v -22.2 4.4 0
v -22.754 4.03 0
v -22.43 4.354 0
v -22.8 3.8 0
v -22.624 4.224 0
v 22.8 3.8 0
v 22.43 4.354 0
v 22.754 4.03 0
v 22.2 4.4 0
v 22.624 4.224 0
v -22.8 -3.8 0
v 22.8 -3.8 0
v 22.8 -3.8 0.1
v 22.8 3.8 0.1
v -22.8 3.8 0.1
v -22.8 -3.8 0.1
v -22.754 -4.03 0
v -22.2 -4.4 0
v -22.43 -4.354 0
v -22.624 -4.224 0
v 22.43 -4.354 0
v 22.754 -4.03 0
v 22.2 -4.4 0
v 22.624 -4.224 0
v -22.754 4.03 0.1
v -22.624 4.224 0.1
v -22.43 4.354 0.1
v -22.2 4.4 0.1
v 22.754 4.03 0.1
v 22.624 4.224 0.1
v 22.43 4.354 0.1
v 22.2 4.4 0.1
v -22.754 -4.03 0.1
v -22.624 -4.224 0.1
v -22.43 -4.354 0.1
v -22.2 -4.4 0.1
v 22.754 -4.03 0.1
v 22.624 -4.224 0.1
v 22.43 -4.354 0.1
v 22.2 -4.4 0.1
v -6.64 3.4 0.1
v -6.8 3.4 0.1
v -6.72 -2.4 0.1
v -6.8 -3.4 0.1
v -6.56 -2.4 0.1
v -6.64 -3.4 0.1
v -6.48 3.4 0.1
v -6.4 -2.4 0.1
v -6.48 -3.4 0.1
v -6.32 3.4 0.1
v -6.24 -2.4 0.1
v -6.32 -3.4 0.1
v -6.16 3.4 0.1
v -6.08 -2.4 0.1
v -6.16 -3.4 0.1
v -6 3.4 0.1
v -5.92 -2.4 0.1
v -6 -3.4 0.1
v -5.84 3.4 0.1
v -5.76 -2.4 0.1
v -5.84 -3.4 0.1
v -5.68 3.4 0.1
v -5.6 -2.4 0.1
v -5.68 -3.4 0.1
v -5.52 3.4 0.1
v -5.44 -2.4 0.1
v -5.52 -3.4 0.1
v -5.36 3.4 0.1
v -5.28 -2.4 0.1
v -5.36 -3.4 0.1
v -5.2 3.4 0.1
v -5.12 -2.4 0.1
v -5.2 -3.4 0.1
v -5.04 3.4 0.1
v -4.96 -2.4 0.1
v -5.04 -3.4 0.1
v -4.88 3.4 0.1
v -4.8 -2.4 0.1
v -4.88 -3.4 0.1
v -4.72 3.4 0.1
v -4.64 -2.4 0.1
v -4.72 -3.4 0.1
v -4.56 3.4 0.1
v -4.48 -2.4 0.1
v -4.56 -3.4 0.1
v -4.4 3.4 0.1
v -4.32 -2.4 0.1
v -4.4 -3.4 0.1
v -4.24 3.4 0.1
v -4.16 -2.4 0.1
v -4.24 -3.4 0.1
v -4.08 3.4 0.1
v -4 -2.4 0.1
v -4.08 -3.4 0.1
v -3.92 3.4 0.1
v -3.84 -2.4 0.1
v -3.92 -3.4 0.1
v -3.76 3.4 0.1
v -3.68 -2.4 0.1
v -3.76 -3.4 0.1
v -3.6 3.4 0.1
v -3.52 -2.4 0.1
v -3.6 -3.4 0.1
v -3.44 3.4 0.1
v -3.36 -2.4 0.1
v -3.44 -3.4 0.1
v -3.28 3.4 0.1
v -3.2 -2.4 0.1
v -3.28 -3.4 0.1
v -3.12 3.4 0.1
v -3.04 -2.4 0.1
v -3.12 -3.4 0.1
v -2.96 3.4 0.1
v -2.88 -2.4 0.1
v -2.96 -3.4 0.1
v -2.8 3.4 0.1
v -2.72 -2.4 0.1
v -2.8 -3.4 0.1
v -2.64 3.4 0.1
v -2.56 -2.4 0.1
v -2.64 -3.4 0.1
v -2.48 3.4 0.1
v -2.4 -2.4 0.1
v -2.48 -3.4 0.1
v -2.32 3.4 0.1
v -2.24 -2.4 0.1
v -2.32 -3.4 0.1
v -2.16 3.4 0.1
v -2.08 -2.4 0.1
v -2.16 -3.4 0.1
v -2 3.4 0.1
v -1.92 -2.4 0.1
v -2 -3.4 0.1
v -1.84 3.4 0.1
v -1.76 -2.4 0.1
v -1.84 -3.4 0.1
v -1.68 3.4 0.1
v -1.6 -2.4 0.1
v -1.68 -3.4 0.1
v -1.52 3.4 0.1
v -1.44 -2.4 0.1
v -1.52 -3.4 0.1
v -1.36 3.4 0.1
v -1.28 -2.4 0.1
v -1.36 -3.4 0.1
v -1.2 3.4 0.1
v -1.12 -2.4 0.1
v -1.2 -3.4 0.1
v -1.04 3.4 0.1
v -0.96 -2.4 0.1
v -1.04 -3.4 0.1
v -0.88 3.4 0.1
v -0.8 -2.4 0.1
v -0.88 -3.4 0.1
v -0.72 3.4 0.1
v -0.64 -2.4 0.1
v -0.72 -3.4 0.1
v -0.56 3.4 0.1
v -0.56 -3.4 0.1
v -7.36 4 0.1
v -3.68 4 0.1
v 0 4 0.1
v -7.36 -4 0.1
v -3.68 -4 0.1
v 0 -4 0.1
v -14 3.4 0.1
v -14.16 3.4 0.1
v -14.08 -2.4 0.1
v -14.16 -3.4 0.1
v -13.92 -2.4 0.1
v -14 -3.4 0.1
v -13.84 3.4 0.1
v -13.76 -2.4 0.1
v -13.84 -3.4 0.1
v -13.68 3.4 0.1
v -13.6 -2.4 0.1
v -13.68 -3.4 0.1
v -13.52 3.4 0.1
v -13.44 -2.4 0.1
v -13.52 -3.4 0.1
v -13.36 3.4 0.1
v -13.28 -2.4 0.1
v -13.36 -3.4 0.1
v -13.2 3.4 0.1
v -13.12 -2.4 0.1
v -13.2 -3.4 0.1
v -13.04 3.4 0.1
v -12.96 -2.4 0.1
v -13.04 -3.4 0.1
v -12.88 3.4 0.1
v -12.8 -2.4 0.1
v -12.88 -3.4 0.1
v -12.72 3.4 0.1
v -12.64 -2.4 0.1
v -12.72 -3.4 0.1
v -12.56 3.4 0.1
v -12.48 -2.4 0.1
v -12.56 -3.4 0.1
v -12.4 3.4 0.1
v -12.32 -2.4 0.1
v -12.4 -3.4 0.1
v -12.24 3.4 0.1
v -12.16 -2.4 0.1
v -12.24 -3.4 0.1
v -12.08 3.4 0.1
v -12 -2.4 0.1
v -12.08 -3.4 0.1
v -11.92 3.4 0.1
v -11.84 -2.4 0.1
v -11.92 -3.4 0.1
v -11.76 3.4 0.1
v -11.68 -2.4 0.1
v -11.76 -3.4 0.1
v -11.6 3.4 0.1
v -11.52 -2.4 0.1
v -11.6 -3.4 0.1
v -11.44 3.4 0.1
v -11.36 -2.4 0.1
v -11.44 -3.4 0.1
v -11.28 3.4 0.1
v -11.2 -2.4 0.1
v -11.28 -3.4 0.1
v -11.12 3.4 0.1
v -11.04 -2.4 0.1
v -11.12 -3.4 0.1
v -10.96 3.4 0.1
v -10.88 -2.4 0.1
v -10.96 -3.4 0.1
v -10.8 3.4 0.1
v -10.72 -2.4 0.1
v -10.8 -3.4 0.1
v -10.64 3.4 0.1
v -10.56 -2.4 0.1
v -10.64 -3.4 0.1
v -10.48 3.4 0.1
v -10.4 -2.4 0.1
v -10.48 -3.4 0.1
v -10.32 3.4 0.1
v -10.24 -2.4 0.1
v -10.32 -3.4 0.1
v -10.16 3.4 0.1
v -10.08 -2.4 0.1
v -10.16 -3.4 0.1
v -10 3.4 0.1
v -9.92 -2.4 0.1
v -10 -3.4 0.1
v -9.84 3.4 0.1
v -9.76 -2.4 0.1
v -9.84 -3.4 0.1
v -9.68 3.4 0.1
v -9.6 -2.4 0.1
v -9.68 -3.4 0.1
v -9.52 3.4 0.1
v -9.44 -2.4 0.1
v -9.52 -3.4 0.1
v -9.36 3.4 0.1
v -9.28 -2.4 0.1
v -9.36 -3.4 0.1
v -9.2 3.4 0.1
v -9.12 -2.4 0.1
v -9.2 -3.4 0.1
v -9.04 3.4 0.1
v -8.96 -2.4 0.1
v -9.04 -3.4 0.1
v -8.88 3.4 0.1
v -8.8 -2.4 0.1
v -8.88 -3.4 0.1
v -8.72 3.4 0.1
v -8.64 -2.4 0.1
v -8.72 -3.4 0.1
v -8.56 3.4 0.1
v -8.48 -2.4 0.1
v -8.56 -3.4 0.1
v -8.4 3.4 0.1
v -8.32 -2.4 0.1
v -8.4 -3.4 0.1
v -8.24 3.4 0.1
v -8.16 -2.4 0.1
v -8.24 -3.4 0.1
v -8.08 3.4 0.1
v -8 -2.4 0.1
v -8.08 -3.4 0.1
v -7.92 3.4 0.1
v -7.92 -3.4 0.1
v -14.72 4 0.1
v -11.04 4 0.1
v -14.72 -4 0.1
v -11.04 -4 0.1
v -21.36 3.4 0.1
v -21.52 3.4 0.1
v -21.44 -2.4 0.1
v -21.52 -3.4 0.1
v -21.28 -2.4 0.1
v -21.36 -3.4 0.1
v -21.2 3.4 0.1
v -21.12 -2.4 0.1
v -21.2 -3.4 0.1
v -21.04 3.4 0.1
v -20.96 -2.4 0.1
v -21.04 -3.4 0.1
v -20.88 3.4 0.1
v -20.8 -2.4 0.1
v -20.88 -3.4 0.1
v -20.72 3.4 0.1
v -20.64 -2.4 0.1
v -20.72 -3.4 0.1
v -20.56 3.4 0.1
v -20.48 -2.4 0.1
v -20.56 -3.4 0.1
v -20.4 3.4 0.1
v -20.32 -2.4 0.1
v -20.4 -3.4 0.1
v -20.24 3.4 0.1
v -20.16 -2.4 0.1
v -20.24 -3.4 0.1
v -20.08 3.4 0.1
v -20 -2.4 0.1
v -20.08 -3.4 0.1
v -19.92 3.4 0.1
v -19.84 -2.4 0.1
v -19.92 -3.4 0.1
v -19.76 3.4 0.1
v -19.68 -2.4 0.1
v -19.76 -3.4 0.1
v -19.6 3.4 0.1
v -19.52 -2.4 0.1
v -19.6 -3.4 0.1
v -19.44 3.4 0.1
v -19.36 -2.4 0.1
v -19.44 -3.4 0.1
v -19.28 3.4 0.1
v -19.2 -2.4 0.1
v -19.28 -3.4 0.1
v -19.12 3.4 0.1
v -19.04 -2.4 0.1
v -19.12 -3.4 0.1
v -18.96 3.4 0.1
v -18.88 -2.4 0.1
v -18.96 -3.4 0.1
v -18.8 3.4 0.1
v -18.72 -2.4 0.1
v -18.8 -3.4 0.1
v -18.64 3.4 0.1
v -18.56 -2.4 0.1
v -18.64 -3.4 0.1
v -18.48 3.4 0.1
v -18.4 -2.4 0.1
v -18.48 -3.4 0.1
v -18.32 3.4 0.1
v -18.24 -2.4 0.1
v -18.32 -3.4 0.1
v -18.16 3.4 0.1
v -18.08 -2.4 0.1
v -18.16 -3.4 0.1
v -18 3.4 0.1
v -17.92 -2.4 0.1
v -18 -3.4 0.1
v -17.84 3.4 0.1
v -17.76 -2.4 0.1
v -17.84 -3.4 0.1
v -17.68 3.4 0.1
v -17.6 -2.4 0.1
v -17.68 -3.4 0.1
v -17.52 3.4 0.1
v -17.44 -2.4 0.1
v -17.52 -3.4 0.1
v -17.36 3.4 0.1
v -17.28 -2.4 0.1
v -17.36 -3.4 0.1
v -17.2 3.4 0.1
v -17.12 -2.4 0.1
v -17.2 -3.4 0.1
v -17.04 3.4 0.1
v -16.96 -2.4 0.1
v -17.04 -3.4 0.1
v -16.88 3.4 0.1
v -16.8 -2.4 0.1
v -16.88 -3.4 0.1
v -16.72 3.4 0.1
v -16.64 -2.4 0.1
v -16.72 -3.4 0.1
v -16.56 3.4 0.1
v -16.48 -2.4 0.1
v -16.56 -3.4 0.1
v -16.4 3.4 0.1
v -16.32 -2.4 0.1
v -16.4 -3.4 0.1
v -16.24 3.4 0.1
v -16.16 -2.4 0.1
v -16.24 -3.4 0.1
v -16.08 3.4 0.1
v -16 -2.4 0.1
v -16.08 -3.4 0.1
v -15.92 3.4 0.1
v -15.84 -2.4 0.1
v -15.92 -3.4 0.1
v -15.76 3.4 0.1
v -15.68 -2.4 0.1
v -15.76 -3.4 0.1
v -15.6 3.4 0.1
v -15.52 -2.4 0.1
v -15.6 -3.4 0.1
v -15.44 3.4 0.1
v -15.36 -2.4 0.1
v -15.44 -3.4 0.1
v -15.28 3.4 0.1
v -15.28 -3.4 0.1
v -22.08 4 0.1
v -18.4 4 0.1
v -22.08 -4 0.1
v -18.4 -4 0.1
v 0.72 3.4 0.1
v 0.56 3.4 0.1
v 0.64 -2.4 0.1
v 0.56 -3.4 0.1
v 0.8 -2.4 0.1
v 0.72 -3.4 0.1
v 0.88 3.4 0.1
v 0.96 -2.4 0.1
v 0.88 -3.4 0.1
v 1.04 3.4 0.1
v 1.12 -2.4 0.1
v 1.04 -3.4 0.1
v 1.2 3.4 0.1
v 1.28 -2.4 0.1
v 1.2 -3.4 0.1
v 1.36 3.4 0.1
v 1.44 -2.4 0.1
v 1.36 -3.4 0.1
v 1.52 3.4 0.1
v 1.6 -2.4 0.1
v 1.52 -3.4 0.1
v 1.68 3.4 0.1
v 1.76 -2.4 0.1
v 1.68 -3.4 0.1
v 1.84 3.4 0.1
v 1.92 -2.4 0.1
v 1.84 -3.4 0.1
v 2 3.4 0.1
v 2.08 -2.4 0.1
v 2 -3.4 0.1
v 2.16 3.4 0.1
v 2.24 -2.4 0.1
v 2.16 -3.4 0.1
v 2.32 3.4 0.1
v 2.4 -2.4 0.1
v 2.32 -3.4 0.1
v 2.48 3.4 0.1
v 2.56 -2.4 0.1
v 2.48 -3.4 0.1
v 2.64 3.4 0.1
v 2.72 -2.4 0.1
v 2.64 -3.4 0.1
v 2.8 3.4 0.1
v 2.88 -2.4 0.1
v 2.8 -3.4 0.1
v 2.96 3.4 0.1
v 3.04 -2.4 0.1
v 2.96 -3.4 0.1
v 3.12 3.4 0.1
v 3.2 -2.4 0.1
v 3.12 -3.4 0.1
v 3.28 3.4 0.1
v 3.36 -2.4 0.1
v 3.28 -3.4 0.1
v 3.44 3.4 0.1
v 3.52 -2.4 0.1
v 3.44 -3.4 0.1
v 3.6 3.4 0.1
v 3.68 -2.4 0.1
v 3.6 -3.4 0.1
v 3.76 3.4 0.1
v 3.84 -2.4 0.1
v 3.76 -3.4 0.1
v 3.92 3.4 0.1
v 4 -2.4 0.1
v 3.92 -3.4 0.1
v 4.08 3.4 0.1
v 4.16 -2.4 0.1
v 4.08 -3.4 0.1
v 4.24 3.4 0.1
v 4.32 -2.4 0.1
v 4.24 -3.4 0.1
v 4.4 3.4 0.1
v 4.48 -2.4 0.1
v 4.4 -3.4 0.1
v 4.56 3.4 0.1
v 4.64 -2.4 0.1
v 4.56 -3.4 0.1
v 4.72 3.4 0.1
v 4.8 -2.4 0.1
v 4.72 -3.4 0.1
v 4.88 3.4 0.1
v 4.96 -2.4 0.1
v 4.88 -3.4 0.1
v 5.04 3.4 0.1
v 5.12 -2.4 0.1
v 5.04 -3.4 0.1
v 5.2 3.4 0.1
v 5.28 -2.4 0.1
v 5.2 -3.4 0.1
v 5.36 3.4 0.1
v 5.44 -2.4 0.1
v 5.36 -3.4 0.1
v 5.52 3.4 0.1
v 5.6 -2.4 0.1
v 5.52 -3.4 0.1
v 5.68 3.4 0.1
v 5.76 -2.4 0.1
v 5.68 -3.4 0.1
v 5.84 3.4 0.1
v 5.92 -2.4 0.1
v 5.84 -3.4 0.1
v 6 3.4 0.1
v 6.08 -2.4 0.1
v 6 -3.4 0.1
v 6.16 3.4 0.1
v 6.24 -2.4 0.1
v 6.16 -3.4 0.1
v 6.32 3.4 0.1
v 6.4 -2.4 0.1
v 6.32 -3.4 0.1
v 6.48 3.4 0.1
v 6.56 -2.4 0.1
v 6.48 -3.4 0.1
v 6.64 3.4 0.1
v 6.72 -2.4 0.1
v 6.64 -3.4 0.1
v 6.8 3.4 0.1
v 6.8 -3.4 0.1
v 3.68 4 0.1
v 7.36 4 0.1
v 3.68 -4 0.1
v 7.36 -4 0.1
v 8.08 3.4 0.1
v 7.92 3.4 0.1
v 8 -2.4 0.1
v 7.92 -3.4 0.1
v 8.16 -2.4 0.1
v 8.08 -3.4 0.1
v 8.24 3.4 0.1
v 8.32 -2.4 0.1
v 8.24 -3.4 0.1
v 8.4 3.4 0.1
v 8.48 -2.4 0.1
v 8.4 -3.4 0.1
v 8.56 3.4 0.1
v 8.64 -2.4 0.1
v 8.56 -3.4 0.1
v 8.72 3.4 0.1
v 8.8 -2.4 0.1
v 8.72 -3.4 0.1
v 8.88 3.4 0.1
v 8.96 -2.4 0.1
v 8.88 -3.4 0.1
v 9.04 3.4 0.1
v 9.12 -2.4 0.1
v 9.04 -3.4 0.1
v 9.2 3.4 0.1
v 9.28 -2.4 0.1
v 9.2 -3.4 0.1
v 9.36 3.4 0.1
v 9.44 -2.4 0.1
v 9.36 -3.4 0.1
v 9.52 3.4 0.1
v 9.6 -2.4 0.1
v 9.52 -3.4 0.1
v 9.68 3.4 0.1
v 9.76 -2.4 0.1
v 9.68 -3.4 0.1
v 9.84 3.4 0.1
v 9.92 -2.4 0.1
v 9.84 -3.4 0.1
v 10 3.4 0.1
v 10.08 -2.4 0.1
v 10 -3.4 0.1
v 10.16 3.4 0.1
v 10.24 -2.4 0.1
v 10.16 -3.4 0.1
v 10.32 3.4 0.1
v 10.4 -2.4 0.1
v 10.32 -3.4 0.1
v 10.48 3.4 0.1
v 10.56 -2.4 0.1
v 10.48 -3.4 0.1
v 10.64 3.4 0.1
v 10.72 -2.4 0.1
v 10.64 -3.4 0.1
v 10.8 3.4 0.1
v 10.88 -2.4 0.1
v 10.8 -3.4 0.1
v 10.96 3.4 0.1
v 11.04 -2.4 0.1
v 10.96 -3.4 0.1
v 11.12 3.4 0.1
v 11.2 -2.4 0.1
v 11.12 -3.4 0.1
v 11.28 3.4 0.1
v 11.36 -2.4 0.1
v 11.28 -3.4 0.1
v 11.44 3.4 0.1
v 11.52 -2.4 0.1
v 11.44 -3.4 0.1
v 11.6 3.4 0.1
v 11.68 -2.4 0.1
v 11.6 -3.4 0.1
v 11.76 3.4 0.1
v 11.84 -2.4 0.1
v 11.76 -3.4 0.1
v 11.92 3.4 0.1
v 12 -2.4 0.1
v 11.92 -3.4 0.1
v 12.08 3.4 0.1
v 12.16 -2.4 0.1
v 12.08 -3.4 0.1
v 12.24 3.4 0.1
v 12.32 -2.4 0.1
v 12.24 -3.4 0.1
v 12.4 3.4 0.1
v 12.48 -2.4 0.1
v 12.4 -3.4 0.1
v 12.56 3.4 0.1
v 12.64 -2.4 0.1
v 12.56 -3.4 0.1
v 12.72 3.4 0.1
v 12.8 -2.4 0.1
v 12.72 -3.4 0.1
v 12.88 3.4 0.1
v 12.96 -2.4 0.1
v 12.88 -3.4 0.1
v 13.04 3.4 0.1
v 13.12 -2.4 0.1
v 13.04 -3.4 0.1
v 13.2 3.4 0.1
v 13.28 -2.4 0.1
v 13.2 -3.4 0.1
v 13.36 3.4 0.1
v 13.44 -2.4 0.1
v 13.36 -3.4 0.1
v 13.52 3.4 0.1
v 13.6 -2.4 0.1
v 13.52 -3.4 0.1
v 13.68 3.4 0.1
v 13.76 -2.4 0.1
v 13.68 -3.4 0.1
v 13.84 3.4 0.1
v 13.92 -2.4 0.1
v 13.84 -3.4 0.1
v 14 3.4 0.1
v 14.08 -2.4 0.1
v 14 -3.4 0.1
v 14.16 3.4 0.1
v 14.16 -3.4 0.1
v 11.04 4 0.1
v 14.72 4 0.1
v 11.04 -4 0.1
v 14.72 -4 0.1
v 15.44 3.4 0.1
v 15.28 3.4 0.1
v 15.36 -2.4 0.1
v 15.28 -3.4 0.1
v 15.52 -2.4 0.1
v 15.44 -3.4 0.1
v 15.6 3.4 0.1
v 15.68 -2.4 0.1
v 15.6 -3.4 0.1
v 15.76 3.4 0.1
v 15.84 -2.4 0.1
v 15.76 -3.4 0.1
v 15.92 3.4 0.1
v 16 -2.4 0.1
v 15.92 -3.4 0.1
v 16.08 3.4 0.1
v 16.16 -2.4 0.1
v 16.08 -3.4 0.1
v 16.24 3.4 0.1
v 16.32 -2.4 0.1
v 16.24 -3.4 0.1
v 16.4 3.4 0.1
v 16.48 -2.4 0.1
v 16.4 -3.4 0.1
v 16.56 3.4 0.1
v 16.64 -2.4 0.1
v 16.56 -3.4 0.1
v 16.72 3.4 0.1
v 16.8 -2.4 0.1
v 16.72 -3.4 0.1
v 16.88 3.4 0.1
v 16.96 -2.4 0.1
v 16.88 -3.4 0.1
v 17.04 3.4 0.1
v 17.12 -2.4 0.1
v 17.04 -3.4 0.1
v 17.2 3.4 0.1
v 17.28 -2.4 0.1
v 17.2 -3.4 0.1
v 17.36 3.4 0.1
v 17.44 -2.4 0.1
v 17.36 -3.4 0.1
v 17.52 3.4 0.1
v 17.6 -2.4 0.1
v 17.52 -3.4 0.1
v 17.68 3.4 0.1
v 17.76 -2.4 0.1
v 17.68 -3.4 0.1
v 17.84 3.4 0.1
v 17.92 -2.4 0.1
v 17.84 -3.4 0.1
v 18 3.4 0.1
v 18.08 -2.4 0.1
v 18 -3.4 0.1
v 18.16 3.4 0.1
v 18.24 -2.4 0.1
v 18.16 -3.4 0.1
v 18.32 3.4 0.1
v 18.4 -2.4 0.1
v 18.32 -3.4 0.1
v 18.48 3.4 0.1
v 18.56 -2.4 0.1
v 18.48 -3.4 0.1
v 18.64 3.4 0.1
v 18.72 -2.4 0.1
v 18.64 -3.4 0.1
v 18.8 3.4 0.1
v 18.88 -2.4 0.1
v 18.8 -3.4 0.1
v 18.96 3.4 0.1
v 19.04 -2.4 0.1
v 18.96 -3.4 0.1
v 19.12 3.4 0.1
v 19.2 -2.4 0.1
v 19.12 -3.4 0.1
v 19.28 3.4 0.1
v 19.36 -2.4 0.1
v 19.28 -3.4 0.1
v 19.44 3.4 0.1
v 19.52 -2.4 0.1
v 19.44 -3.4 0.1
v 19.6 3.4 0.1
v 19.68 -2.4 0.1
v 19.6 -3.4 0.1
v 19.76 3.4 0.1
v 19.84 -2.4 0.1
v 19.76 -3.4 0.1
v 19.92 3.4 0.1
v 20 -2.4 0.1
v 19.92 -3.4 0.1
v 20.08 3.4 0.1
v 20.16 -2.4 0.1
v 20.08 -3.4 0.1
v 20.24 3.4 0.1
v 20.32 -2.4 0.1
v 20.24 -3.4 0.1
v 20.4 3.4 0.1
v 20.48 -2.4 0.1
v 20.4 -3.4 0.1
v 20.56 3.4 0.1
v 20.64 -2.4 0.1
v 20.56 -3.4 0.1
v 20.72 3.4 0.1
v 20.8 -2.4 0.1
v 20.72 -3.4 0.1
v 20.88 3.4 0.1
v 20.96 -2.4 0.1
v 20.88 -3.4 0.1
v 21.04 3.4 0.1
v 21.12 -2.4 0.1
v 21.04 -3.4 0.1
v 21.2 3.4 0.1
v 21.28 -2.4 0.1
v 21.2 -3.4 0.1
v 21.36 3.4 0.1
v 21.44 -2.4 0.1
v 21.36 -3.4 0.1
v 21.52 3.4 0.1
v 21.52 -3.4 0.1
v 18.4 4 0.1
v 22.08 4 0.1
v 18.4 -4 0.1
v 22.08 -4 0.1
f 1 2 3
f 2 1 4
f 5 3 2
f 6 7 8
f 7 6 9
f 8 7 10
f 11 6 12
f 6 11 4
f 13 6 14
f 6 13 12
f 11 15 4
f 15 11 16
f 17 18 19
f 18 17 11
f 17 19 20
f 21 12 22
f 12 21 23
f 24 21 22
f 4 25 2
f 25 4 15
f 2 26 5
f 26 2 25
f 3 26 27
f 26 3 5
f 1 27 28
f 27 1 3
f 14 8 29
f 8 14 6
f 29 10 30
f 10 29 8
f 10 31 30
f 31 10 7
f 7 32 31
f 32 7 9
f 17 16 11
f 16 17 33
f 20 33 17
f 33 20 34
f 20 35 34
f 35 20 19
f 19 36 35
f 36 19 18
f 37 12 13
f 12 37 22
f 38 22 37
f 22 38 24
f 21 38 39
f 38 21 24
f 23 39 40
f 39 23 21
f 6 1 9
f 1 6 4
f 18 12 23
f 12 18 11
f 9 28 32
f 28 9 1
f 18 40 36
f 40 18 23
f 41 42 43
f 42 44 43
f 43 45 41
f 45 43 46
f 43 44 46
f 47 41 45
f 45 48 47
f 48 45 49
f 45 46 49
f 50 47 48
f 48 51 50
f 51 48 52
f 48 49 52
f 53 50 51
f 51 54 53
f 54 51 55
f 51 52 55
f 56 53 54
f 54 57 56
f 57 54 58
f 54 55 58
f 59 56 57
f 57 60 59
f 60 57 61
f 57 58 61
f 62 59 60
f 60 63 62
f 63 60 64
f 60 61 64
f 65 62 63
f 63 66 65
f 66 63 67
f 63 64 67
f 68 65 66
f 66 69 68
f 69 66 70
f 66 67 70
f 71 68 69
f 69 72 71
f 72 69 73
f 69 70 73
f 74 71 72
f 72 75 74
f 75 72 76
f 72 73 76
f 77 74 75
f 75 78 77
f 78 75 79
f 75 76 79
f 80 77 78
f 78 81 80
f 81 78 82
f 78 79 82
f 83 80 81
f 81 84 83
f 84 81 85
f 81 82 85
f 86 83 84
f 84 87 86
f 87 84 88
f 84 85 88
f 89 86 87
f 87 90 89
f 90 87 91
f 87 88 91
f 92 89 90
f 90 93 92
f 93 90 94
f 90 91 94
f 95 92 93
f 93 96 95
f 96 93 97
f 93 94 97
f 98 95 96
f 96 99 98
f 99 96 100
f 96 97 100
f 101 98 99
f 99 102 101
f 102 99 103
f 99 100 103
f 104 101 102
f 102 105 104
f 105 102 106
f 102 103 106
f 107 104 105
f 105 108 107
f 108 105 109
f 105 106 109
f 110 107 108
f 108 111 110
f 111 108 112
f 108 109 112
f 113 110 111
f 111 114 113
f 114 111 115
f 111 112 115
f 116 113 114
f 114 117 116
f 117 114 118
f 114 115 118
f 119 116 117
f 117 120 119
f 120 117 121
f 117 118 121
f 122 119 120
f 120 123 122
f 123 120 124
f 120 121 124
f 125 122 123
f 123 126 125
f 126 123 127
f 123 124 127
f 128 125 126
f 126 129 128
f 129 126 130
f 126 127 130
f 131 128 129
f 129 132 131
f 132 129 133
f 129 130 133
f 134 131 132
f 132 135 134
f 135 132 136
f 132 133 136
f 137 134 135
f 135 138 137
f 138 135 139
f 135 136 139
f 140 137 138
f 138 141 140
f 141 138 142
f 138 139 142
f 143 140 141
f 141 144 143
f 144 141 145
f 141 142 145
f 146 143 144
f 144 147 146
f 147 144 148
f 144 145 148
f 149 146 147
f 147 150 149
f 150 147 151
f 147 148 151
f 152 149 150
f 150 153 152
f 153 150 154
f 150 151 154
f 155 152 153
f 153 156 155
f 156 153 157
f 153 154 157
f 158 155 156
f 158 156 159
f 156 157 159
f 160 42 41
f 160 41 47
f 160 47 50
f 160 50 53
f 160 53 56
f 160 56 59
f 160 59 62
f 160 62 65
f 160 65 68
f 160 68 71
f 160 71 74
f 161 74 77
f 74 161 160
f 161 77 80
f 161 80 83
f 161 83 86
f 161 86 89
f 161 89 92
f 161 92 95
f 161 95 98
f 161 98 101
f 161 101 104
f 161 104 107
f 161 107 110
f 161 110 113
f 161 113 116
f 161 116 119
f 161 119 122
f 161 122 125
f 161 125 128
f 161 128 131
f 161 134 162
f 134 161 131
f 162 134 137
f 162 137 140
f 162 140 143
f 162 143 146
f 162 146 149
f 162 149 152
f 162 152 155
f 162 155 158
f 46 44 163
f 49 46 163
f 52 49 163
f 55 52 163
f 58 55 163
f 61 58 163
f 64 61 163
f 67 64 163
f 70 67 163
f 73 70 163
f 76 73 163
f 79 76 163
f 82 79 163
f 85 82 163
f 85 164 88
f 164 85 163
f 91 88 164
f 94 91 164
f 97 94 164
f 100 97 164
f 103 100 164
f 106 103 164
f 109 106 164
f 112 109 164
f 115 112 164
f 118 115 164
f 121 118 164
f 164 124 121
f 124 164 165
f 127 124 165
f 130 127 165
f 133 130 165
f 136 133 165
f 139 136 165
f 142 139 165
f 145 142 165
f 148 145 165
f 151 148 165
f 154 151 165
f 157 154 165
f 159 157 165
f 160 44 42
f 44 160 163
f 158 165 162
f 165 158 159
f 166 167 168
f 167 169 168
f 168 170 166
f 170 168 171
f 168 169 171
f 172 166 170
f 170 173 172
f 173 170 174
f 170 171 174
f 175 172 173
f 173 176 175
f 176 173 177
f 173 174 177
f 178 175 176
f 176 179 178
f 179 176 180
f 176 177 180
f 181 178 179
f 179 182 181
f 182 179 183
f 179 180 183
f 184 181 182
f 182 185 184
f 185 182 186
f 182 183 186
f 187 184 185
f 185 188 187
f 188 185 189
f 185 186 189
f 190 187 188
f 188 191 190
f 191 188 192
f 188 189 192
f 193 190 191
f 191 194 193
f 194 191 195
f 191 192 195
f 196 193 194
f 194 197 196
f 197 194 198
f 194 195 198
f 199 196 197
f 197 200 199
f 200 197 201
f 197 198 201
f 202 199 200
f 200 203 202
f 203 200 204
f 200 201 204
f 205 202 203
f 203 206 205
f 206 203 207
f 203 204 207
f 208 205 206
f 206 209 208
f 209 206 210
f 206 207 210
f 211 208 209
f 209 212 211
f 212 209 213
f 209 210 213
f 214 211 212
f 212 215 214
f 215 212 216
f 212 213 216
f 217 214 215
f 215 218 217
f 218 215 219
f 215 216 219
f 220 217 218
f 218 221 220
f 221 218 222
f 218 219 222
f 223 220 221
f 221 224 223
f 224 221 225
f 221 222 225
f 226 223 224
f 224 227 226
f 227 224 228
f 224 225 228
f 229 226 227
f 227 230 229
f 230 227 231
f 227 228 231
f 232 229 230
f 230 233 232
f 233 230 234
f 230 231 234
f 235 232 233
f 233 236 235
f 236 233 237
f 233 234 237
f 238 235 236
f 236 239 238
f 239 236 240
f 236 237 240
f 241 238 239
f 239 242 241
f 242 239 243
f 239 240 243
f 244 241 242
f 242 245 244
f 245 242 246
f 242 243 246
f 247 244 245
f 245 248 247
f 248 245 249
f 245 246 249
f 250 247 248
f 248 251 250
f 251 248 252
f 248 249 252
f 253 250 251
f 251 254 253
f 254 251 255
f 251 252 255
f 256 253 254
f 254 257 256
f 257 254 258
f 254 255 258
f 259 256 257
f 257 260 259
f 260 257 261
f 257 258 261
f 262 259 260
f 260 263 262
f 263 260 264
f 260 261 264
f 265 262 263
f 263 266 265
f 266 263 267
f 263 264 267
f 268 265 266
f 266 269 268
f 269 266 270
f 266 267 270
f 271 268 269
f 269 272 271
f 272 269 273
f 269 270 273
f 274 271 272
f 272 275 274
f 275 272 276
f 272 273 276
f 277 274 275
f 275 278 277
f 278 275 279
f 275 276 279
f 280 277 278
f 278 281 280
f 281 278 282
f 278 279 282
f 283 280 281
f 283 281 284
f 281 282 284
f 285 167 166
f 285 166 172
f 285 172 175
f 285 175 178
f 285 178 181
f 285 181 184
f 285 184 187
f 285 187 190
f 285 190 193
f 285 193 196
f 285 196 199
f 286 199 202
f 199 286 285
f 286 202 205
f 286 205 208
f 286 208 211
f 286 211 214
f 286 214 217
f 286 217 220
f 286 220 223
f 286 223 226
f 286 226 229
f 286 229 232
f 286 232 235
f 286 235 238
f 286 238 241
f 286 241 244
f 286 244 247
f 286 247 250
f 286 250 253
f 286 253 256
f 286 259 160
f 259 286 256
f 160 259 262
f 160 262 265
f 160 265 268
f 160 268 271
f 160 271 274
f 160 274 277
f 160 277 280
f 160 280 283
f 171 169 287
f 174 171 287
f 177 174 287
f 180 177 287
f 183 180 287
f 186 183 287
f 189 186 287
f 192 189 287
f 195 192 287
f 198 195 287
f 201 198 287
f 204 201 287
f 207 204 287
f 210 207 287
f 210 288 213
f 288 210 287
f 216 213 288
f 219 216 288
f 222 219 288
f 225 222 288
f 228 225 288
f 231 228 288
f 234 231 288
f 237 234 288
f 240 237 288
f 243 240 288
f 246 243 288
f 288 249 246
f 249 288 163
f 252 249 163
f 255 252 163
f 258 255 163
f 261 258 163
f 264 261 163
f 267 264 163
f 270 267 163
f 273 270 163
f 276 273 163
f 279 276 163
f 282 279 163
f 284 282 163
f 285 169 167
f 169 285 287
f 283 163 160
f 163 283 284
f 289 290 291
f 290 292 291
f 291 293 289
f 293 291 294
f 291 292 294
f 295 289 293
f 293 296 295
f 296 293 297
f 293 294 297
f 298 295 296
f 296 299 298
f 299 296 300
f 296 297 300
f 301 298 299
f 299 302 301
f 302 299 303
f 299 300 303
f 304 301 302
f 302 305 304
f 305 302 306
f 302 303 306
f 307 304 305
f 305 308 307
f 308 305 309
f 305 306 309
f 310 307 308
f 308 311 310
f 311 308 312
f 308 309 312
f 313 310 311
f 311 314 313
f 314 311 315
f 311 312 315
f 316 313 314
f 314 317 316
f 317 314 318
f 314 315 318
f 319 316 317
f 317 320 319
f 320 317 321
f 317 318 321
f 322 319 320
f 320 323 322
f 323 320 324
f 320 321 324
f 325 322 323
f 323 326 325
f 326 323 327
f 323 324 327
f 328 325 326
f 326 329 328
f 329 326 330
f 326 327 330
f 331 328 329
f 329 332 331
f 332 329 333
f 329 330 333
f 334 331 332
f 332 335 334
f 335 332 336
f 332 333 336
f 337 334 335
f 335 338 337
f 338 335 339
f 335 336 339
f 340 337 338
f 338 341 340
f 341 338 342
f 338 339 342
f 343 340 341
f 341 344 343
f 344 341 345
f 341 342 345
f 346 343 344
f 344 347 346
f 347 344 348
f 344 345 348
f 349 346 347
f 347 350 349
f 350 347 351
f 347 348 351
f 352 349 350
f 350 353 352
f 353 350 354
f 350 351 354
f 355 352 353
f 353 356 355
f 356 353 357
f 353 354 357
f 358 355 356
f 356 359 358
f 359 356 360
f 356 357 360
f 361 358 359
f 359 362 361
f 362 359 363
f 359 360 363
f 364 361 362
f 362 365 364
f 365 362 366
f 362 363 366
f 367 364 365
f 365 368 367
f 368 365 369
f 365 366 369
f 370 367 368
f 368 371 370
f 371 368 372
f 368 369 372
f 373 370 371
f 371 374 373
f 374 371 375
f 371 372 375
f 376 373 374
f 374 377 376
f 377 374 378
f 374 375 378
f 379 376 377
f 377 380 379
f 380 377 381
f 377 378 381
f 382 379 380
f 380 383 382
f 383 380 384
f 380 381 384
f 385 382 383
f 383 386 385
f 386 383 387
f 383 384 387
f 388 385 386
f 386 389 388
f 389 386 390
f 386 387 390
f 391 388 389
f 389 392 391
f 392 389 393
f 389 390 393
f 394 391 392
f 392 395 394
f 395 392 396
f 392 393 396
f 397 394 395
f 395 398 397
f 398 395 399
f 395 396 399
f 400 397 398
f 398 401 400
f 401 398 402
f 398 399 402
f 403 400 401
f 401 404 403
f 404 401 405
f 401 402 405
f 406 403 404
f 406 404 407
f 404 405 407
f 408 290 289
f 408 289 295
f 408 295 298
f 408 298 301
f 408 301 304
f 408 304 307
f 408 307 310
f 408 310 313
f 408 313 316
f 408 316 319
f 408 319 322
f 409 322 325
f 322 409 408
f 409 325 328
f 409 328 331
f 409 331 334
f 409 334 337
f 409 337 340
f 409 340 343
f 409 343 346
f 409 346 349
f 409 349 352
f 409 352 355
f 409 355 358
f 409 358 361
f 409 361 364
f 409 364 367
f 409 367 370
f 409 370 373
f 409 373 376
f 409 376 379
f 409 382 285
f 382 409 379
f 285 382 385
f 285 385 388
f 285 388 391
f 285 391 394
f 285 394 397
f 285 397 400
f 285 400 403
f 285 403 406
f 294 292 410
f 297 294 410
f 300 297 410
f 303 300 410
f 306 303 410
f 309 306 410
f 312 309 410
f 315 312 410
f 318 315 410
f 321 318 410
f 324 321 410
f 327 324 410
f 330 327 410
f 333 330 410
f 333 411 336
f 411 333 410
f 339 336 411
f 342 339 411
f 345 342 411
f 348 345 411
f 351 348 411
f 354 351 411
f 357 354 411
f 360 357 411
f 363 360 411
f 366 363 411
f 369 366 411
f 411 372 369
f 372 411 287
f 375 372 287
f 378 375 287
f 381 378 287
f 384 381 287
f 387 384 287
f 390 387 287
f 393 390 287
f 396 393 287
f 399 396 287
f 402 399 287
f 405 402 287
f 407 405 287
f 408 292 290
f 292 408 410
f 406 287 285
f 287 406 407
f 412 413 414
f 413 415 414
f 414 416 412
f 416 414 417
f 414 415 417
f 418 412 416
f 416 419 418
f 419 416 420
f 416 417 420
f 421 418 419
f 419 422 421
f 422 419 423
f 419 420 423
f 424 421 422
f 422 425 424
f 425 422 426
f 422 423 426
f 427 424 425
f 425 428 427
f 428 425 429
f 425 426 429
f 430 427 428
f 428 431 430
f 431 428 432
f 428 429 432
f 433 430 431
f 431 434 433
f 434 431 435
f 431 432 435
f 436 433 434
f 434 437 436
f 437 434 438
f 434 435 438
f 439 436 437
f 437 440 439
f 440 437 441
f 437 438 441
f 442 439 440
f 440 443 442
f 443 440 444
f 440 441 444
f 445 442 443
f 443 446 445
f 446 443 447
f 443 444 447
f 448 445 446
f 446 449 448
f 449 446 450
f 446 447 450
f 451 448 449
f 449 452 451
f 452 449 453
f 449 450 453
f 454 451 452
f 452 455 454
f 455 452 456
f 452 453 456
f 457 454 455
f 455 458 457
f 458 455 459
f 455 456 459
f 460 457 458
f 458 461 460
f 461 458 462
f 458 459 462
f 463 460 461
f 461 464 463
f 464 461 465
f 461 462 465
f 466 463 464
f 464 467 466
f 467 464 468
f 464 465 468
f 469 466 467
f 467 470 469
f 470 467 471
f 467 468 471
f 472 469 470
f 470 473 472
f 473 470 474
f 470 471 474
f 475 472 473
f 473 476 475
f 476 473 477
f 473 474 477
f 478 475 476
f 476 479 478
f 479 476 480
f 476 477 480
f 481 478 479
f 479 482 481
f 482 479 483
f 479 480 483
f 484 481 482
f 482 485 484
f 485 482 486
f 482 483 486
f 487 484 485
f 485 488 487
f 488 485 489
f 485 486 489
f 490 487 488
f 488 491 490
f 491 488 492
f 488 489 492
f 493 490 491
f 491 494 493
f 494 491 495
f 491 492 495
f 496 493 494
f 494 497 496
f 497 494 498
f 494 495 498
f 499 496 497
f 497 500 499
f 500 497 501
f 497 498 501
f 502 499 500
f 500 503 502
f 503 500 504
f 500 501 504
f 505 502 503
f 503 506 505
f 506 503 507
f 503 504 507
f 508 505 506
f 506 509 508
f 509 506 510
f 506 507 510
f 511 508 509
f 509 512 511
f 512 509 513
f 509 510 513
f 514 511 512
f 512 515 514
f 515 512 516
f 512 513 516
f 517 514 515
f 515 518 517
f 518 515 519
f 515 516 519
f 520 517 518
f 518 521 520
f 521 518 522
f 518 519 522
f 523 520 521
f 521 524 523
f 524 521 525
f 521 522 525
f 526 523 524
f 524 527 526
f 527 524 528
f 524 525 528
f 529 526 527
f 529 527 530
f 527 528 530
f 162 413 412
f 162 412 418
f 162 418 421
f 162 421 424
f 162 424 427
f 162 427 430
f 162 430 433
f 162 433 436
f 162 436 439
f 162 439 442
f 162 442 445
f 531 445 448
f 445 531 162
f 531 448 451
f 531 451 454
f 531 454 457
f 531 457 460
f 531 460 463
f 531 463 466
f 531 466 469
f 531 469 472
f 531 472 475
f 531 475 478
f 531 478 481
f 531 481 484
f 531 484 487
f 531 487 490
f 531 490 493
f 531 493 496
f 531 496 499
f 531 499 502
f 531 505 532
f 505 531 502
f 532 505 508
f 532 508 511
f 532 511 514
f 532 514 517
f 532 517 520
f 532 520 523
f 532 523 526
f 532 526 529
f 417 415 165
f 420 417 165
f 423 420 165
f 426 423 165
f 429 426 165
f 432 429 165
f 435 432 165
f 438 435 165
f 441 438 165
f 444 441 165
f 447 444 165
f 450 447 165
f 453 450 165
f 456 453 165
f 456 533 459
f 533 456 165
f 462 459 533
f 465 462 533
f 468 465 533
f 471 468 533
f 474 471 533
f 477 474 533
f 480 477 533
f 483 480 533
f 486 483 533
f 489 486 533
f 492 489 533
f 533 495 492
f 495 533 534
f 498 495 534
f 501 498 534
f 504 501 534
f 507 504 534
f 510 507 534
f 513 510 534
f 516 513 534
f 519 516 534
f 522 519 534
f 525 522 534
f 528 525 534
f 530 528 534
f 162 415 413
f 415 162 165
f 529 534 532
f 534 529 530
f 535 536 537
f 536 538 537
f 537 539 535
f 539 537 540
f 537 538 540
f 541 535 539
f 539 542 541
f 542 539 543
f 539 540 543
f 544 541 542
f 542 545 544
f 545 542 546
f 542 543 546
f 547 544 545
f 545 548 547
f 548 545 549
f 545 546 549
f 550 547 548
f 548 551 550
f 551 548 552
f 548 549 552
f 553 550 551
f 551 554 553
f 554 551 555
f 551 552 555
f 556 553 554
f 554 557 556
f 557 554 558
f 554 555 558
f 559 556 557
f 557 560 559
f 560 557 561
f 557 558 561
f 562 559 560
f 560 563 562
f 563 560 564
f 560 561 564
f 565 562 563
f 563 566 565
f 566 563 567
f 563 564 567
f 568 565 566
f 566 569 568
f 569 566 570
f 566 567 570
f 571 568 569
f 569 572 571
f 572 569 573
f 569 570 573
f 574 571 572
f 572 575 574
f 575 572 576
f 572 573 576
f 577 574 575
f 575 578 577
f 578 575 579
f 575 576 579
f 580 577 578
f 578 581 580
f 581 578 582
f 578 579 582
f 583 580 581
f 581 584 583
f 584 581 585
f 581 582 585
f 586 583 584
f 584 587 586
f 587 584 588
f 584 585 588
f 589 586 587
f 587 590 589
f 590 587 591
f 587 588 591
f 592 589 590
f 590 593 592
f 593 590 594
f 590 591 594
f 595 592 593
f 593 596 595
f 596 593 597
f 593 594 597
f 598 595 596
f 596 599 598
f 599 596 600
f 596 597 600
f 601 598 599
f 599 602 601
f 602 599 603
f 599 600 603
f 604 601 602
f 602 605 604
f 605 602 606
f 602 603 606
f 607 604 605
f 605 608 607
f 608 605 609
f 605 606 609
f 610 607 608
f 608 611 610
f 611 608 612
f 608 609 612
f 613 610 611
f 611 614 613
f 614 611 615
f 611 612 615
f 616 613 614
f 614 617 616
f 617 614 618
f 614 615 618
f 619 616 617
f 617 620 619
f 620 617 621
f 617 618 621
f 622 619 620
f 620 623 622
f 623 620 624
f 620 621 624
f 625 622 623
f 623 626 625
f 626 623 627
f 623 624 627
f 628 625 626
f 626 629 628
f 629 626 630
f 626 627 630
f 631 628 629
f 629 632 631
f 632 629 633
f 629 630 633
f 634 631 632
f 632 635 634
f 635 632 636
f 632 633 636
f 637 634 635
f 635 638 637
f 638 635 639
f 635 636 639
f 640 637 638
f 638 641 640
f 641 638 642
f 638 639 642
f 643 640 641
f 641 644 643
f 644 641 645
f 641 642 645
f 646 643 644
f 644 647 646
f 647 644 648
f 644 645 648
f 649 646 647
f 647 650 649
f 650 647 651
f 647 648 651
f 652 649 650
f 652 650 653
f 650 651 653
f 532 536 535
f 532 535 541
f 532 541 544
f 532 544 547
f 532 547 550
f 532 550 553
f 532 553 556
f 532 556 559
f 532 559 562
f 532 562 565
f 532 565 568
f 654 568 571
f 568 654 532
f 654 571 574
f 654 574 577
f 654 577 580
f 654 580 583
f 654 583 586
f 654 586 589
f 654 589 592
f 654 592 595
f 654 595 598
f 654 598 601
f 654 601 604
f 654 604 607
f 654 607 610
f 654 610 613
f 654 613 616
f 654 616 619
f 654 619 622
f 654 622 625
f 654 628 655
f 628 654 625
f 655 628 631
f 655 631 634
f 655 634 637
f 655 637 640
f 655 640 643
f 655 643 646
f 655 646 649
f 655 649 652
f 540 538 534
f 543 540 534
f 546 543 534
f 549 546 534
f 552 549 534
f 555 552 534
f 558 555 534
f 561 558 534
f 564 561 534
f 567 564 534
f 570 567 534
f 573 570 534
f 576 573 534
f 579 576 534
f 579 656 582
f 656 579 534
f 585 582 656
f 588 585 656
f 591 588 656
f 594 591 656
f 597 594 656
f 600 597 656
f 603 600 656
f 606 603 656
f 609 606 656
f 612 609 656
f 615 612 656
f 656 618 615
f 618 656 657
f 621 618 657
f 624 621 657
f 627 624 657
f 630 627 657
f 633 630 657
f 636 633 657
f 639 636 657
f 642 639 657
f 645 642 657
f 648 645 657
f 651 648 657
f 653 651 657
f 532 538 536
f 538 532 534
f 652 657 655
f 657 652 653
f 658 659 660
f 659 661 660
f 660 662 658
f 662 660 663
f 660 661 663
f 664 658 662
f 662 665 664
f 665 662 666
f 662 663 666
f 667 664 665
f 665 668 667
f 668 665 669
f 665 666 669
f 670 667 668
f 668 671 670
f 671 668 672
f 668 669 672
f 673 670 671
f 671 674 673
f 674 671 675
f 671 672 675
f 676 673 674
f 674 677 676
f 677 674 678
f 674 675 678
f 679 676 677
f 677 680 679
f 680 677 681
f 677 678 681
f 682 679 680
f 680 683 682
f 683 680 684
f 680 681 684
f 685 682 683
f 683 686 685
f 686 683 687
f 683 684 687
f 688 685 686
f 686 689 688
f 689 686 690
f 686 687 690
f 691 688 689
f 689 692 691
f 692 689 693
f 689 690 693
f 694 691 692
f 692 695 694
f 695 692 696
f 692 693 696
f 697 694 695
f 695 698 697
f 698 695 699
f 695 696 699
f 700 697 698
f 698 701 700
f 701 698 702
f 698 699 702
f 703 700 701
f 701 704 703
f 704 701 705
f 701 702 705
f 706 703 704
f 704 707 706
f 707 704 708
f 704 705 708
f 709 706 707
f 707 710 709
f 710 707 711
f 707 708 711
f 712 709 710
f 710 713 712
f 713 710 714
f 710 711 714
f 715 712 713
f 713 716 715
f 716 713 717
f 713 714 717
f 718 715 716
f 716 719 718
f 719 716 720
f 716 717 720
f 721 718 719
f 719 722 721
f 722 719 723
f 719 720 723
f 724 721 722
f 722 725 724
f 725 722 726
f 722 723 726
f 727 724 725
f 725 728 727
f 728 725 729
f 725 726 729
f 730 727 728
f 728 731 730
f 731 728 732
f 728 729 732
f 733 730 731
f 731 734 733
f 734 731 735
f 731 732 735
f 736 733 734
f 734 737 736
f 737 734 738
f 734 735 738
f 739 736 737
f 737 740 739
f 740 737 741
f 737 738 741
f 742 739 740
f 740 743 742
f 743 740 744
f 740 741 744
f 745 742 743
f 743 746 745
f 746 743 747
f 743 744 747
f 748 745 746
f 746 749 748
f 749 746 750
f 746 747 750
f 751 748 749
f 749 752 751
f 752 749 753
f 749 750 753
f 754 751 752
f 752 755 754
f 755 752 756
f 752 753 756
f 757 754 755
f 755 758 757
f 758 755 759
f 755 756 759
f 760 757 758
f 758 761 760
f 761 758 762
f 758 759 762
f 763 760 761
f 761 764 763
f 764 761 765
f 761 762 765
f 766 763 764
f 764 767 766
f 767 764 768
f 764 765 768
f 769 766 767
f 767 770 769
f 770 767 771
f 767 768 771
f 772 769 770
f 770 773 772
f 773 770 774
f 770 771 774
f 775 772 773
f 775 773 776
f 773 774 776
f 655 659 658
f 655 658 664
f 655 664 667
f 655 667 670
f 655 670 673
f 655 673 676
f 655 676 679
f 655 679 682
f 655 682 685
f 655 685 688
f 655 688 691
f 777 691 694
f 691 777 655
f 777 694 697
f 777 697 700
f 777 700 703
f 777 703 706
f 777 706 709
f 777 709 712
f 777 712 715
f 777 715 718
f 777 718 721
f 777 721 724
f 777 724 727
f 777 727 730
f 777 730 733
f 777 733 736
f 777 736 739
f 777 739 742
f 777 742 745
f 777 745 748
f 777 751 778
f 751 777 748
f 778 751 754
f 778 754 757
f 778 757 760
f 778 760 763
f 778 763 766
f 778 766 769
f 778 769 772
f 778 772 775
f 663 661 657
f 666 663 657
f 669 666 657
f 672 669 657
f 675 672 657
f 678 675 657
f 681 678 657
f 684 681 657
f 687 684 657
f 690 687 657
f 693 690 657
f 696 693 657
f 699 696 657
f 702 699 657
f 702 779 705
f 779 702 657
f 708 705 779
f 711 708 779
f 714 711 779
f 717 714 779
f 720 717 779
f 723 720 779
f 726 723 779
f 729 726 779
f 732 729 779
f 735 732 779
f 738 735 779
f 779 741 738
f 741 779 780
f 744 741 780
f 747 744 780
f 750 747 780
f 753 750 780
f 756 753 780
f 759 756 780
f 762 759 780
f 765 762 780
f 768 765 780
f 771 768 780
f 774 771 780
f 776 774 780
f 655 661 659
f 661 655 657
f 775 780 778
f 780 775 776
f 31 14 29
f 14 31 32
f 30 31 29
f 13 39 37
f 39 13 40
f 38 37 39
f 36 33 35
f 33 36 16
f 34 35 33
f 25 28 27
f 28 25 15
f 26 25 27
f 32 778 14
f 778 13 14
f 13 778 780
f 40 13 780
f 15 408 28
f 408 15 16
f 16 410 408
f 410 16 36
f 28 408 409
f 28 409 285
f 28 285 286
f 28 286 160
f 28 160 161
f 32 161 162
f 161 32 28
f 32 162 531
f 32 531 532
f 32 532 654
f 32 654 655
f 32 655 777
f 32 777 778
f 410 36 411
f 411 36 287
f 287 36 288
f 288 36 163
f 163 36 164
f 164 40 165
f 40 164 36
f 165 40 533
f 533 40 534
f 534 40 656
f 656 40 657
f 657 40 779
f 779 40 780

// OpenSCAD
// file: ../p/box3u12.scad
use <../lib.scad>
function ldraw_lib__box3u12() = [
// 0 Box with 3 Parallel Faces without Any Edges
// 0 Name: box3u12.dat
// 0 Author: J.C. Tchang [tchang]
// 0 !LDRAW_ORG Primitive UPDATE 2014-02
// 0 !LICENSE Licensed under CC BY 4.0 : see CAreadme.txt
// 
// 0 BFC CERTIFY CCW
  [0,"BFC","CERTIFY"],
  [0,"BFC","CCW"],
// 
// 0 !HISTORY 2014-12-23 [PTadmin] Official Update 2014-02
// 
// 
// 4 16 -1 1 1 1 1 1 1 1 -1 -1 1 -1
  [4,16,-1,1,1,1,1,1,1,1,-1,-1,1,-1],
// 4 16 -1 1 1 -1 0 1 1 0 1 1 1 1
  [4,16,-1,1,1,-1,0,1,1,0,1,1,1,1],
// 4 16 1 1 -1 1 0 -1 -1 0 -1 -1 1 -1
  [4,16,1,1,-1,1,0,-1,-1,0,-1,-1,1,-1],
];
module ldraw_lib__box3u12(step=0, col=false, unit=2/5, alt=false, line=0.2, solid=!$preview)
    makepoly(ldraw_lib__box3u12(), step=step, col=col, unit=unit, alt=alt, line=line, solid=solid);
ldraw_lib__box3u12(line=0.2);
// file: ../p/1-4cyli.scad
use <../lib.scad>
function ldraw_lib__1_4cyli() = [
// 0 Cylinder 0.25
// 0 Name: 1-4cyli.dat
// 0 Author: James Jessiman
// 0 !LDRAW_ORG Primitive UPDATE 2012-01
// 0 !LICENSE Licensed under CC BY 4.0 : see CAreadme.txt
// 
// 0 BFC CERTIFY CCW
  [0,"BFC","CERTIFY"],
  [0,"BFC","CCW"],
// 
// 0 !HISTORY 2002-03-23 [sbliss] Added BFC statement.
// 0 !HISTORY 2002-04-25 [PTadmin] Official Update 2002-02
// 0 !HISTORY 2007-06-22 [PTadmin] Header formatted for Contributor Agreement
// 0 !HISTORY 2008-07-01 [PTadmin] Official Update 2008-01
// 0 !HISTORY 2012-02-16 [Philo] Changed to CCW
// 0 !HISTORY 2012-03-30 [PTadmin] Official Update 2012-01
// 
// 
// 4 16 1 1 0 0.9239 1 0.3827 0.9239 0 0.3827 1 0 0
  [4,16,1,1,0,0.9239,1,0.3827,0.9239,0,0.3827,1,0,0],
// 5 24 1 0 0 1 1 0 0.9239 0 0.3827 1 0 -1
  [5,24,1,0,0,1,1,0,0.9239,0,0.3827,1,0,-1],
// 4 16 0.9239 1 0.3827 0.7071 1 0.7071 0.7071 0 0.7071 0.9239 0 0.3827
  [4,16,0.9239,1,0.3827,0.7071,1,0.7071,0.7071,0,0.7071,0.9239,0,0.3827],
// 5 24 0.9239 0 0.3827 0.9239 1 0.3827 0.7071 0 0.7071 1 0 0
  [5,24,0.9239,0,0.3827,0.9239,1,0.3827,0.7071,0,0.7071,1,0,0],
// 4 16 0.7071 1 0.7071 0.3827 1 0.9239 0.3827 0 0.9239 0.7071 0 0.7071
  [4,16,0.7071,1,0.7071,0.3827,1,0.9239,0.3827,0,0.9239,0.7071,0,0.7071],
// 5 24 0.7071 0 0.7071 0.7071 1 0.7071 0.3827 0 0.9239 0.9239 0 0.3827
  [5,24,0.7071,0,0.7071,0.7071,1,0.7071,0.3827,0,0.9239,0.9239,0,0.3827],
// 4 16 0.3827 1 0.9239 0 1 1 0 0 1 0.3827 0 0.9239
  [4,16,0.3827,1,0.9239,0,1,1,0,0,1,0.3827,0,0.9239],
// 5 24 0.3827 0 0.9239 0.3827 1 0.9239 0 0 1 0.7071 0 0.7071
  [5,24,0.3827,0,0.9239,0.3827,1,0.9239,0,0,1,0.7071,0,0.7071],
// 5 24 0 0 1 0 1 1 0.3827 0 0.9239 -1 0 1
  [5,24,0,0,1,0,1,1,0.3827,0,0.9239,-1,0,1],
];
module ldraw_lib__1_4cyli(step=0, col=false, unit=2/5, alt=false, line=0.2, solid=!$preview)
    makepoly(ldraw_lib__1_4cyli(), step=step, col=col, unit=unit, alt=alt, line=line, solid=solid);
ldraw_lib__1_4cyli(line=0.2);
// file: s/stickerback011x057.scad
use <../../lib.scad>
use <../../p/1-4chrd.scad>
use <../../p/1-4cyli.scad>
use <../../p/box3u12.scad>
function ldraw_lib__s__stickerback011x057() = [
// 0 ~Sticker Back  1.1 x  5.7
// 0 Name: s\stickerback011x057.dat
// 0 Author: Evert-Jan Boer [ejboer]
// 0 !LDRAW_ORG Subpart UPDATE 2026-08
// 0 !LICENSE Licensed under CC BY 4.0 : see CAreadme.txt
// 
// 0 BFC CERTIFY CCW
  [0,"BFC","CERTIFY"],
  [0,"BFC","CCW"],
// 
// 0 !HISTORY 2026-08-31 [OrionP] Official Update 2026-08
// 
// 0 // Primitives
// 1 16 -55.5 0 9.5 -1.5 0 0 0 -1 0 0 0 1.5 1-4chrd.dat
  [1,16,-55.5,0,9.5,-1.5,0,0,0,-1,0,0,0,1.5, ldraw_lib__1_4chrd()],
// 1 16 55.5 0 9.5 1.5 0 0 0 -1 0 0 0 1.5 1-4chrd.dat
  [1,16,55.5,0,9.5,1.5,0,0,0,-1,0,0,0,1.5, ldraw_lib__1_4chrd()],
// 1 16 0 -.25 0 0 0 57 0 .25 0 9.5 0 0 box3u12.dat
  [1,16,0,-.25,0,0,0,57,0,.25,0,9.5,0,0, ldraw_lib__box3u12()],
// 1 16 -55.5 0 -9.5 -1.5 0 0 0 -1 0 0 0 -1.5 1-4chrd.dat
  [1,16,-55.5,0,-9.5,-1.5,0,0,0,-1,0,0,0,-1.5, ldraw_lib__1_4chrd()],
// 1 16 55.5 0 -9.5 1.5 0 0 0 -1 0 0 0 -1.5 1-4chrd.dat
  [1,16,55.5,0,-9.5,1.5,0,0,0,-1,0,0,0,-1.5, ldraw_lib__1_4chrd()],
// 1 16 -55.5 0 9.5 -1.5 0 0 0 -.25 0 0 0 1.5 1-4cyli.dat
  [1,16,-55.5,0,9.5,-1.5,0,0,0,-.25,0,0,0,1.5, ldraw_lib__1_4cyli()],
// 1 16 55.5 0 9.5 1.5 0 0 0 -.25 0 0 0 1.5 1-4cyli.dat
  [1,16,55.5,0,9.5,1.5,0,0,0,-.25,0,0,0,1.5, ldraw_lib__1_4cyli()],
// 1 16 -55.5 0 -9.5 -1.5 0 0 0 -.25 0 0 0 -1.5 1-4cyli.dat
  [1,16,-55.5,0,-9.5,-1.5,0,0,0,-.25,0,0,0,-1.5, ldraw_lib__1_4cyli()],
// 1 16 55.5 0 -9.5 1.5 0 0 0 -.25 0 0 0 -1.5 1-4cyli.dat
  [1,16,55.5,0,-9.5,1.5,0,0,0,-.25,0,0,0,-1.5, ldraw_lib__1_4cyli()],
// 0 // Bottom face
// 4 16 -57 0 9.5 -55.5 0 11 55.5 0 11 57 0 9.5
  [4,16,-57,0,9.5,-55.5,0,11,55.5,0,11,57,0,9.5],
// 4 16 -57 0 -9.5 57 0 -9.5 55.5 0 -11 -55.5 0 -11
  [4,16,-57,0,-9.5,57,0,-9.5,55.5,0,-11,-55.5,0,-11],
// 0 // Lateral face
// 4 16 -55.5 0 11 -55.5 -.25 11 55.5 -.25 11 55.5 0 11
  [4,16,-55.5,0,11,-55.5,-.25,11,55.5,-.25,11,55.5,0,11],
// 4 16 -55.5 0 -11 55.5 0 -11 55.5 -.25 -11 -55.5 -.25 -11
  [4,16,-55.5,0,-11,55.5,0,-11,55.5,-.25,-11,-55.5,-.25,-11],
];
module ldraw_lib__s__stickerback011x057(step=0, col=false, unit=2/5, alt=false, line=0.2, solid=!$preview)
    makepoly(ldraw_lib__s__stickerback011x057(), step=step, col=col, unit=unit, alt=alt, line=line, solid=solid);
ldraw_lib__s__stickerback011x057(line=0.2);
// file: ../p/1-4chrd.scad
use <../lib.scad>
function ldraw_lib__1_4chrd() = [
// 0 Chord 0.25
// 0 Name: 1-4chrd.dat
// 0 Author: Max Martin Richter [MMR1988]
// 0 !LDRAW_ORG Primitive UPDATE 2023-05
// 0 !LICENSE Licensed under CC BY 4.0 : see CAreadme.txt
// 
// 0 BFC CERTIFY CCW
  [0,"BFC","CERTIFY"],
  [0,"BFC","CCW"],
// 
// 0 !HISTORY 2004-04-22 [PTadmin] Official Update 2004-02
// 0 !HISTORY 2007-10-09 [PTadmin] Header formatted for Contributor Agreement
// 0 !HISTORY 2008-07-01 [PTadmin] Official Update 2008-01
// 0 !HISTORY 2012-08-02 [MMR1988] Re-creation with PrimGen2 and Rectifier
// 0 !HISTORY 2012-08-09 [PTadmin] Official Update 2012-02
// 0 !HISTORY 2023-10-27 [OrionP] Change author to MMR1988 from hafhead
// 0 !HISTORY 2023-10-31 [OrionP] Official Update 2023-05
// 
// 4 16 0.9239 0 0.3827 0.3827 0 0.9239 0 0 1 1 0 0
  [4,16,0.9239,0,0.3827,0.3827,0,0.9239,0,0,1,1,0,0],
// 3 16 0.7071 0 0.7071 0.3827 0 0.9239 0.9239 0 0.3827
  [3,16,0.7071,0,0.7071,0.3827,0,0.9239,0.9239,0,0.3827],
];
module ldraw_lib__1_4chrd(step=0, col=false, unit=2/5, alt=false, line=0.2, solid=!$preview)
    makepoly(ldraw_lib__1_4chrd(), step=step, col=col, unit=unit, alt=alt, line=line, solid=solid);
ldraw_lib__1_4chrd(line=0.2);
// main file
use <../lib.scad>
use <../p/1-4chrd.scad>
use <s/4269558cs01.scad>
use <s/stickerback011x057.scad>
function ldraw_lib__4269558c() = [
// 0 Sticker  1.1 x  5.7 with  6 Yellow Windows
// 0 Name: 4269558c.dat
// 0 Author: Evert-Jan Boer [ejboer]
// 0 !LDRAW_ORG Part UPDATE 2026-08
// 0 !LICENSE Licensed under CC BY 4.0 : see CAreadme.txt
// 
// 0 BFC CERTIFY CCW
  [0,"BFC","CERTIFY"],
  [0,"BFC","CCW"],
// 
// 0 !CATEGORY Sticker
// 0 !KEYWORDS Bricklink 10144stk01, Brickowl 90386, Rebrickable 53390, Sandcrawler
// 0 !KEYWORDS Set 10144
// 
// 0 !HISTORY 2026-08-31 [OrionP] Official Update 2026-08
// 
// 1 16 0 0 0 1 0 0 0 1 0 0 0 1 s\stickerback011x057.dat
  [1,16,0,0,0,1,0,0,0,1,0,0,0,1, ldraw_lib__s__stickerback011x057()],
// 
// 1 16 -9.2 -.25 0 1 0 0 0 1 0 0 0 1 s\4269558cs01.dat
  [1,16,-9.2,-.25,0,1,0,0,0,1,0,0,0,1, ldraw_lib__s__4269558cs01()],
// 1 16 -27.6 -.25 0 1 0 0 0 1 0 0 0 1 s\4269558cs01.dat
  [1,16,-27.6,-.25,0,1,0,0,0,1,0,0,0,1, ldraw_lib__s__4269558cs01()],
// 1 16 -46 -.25 0 1 0 0 0 1 0 0 0 1 s\4269558cs01.dat
  [1,16,-46,-.25,0,1,0,0,0,1,0,0,0,1, ldraw_lib__s__4269558cs01()],
// 1 16 9.2 -.25 0 1 0 0 0 1 0 0 0 1 s\4269558cs01.dat
  [1,16,9.2,-.25,0,1,0,0,0,1,0,0,0,1, ldraw_lib__s__4269558cs01()],
// 1 16 27.6 -.25 0 1 0 0 0 1 0 0 0 1 s\4269558cs01.dat
  [1,16,27.6,-.25,0,1,0,0,0,1,0,0,0,1, ldraw_lib__s__4269558cs01()],
// 1 16 46 -.25 0 1 0 0 0 1 0 0 0 1 s\4269558cs01.dat
  [1,16,46,-.25,0,1,0,0,0,1,0,0,0,1, ldraw_lib__s__4269558cs01()],
// 
// 1 70 55.5 -.25 9.5 1.5 0 0 0 1 0 0 0 1.5 1-4chrd.dat
  [1,70,55.5,-.25,9.5,1.5,0,0,0,1,0,0,0,1.5, ldraw_lib__1_4chrd()],
// 1 70 55.5 -.25 -9.5 0 0 1.5 0 1 0 -1.5 0 0 1-4chrd.dat
  [1,70,55.5,-.25,-9.5,0,0,1.5,0,1,0,-1.5,0,0, ldraw_lib__1_4chrd()],
// 1 70 -55.5 -.25 -9.5 -1.5 0 0 0 1 0 0 0 -1.5 1-4chrd.dat
  [1,70,-55.5,-.25,-9.5,-1.5,0,0,0,1,0,0,0,-1.5, ldraw_lib__1_4chrd()],
// 1 70 -55.5 -.25 9.5 0 0 -1.5 0 1 0 1.5 0 0 1-4chrd.dat
  [1,70,-55.5,-.25,9.5,0,0,-1.5,0,1,0,1.5,0,0, ldraw_lib__1_4chrd()],
// 3 70 55.5 -.25 11 55.2 -.25 10 57 -.25 9.5
  [3,70,55.5,-.25,11,55.2,-.25,10,57,-.25,9.5],
// 4 70 57 -.25 9.5 55.2 -.25 10 55.2 -.25 -10 57 -.25 -9.5
  [4,70,57,-.25,9.5,55.2,-.25,10,55.2,-.25,-10,57,-.25,-9.5],
// 3 70 55.5 -.25 -11 57 -.25 -9.5 55.2 -.25 -10
  [3,70,55.5,-.25,-11,57,-.25,-9.5,55.2,-.25,-10],
// 
// 4 70 -55.5 -.25 11 -57 -.25 9.5 -57 -.25 -9.5 -55.2 -.25 10
  [4,70,-55.5,-.25,11,-57,-.25,9.5,-57,-.25,-9.5,-55.2,-.25,10],
// 4 70 -55.5 -.25 -11 -55.2 -.25 -10 -55.2 -.25 10 -57 -.25 -9.5
  [4,70,-55.5,-.25,-11,-55.2,-.25,-10,-55.2,-.25,10,-57,-.25,-9.5],
// 3 70 -55.5 -.25 11 -55.2 -.25 10 -46 -.25 10
  [3,70,-55.5,-.25,11,-55.2,-.25,10,-46,-.25,10],
// 3 70 -55.5 -.25 11 -46 -.25 10 -36.8 -.25 10
  [3,70,-55.5,-.25,11,-46,-.25,10,-36.8,-.25,10],
// 3 70 -55.5 -.25 11 -36.8 -.25 10 -27.6 -.25 10
  [3,70,-55.5,-.25,11,-36.8,-.25,10,-27.6,-.25,10],
// 3 70 -55.5 -.25 11 -27.6 -.25 10 -18.4 -.25 10
  [3,70,-55.5,-.25,11,-27.6,-.25,10,-18.4,-.25,10],
// 3 70 -55.5 -.25 11 -18.4 -.25 10 -9.2 -.25 10
  [3,70,-55.5,-.25,11,-18.4,-.25,10,-9.2,-.25,10],
// 4 70 55.5 -.25 11 -55.5 -.25 11 -9.2 -.25 10 0 -.25 10
  [4,70,55.5,-.25,11,-55.5,-.25,11,-9.2,-.25,10,0,-.25,10],
// 3 70 55.5 -.25 11 0 -.25 10 9.2 -.25 10
  [3,70,55.5,-.25,11,0,-.25,10,9.2,-.25,10],
// 3 70 55.5 -.25 11 9.2 -.25 10 18.4 -.25 10
  [3,70,55.5,-.25,11,9.2,-.25,10,18.4,-.25,10],
// 3 70 55.5 -.25 11 18.4 -.25 10 27.6 -.25 10
  [3,70,55.5,-.25,11,18.4,-.25,10,27.6,-.25,10],
// 3 70 55.5 -.25 11 27.6 -.25 10 36.8 -.25 10
  [3,70,55.5,-.25,11,27.6,-.25,10,36.8,-.25,10],
// 3 70 55.5 -.25 11 36.8 -.25 10 46 -.25 10
  [3,70,55.5,-.25,11,36.8,-.25,10,46,-.25,10],
// 3 70 55.5 -.25 11 46 -.25 10 55.2 -.25 10
  [3,70,55.5,-.25,11,46,-.25,10,55.2,-.25,10],
// 3 70 -55.2 -.25 -10 -55.5 -.25 -11 -46 -.25 -10
  [3,70,-55.2,-.25,-10,-55.5,-.25,-11,-46,-.25,-10],
// 3 70 -46 -.25 -10 -55.5 -.25 -11 -36.8 -.25 -10
  [3,70,-46,-.25,-10,-55.5,-.25,-11,-36.8,-.25,-10],
// 3 70 -36.8 -.25 -10 -55.5 -.25 -11 -27.6 -.25 -10
  [3,70,-36.8,-.25,-10,-55.5,-.25,-11,-27.6,-.25,-10],
// 3 70 -27.6 -.25 -10 -55.5 -.25 -11 -18.4 -.25 -10
  [3,70,-27.6,-.25,-10,-55.5,-.25,-11,-18.4,-.25,-10],
// 3 70 -18.4 -.25 -10 -55.5 -.25 -11 -9.2 -.25 -10
  [3,70,-18.4,-.25,-10,-55.5,-.25,-11,-9.2,-.25,-10],
// 4 70 55.5 -.25 -11 0 -.25 -10 -9.2 -.25 -10 -55.5 -.25 -11
  [4,70,55.5,-.25,-11,0,-.25,-10,-9.2,-.25,-10,-55.5,-.25,-11],
// 3 70 0 -.25 -10 55.5 -.25 -11 9.2 -.25 -10
  [3,70,0,-.25,-10,55.5,-.25,-11,9.2,-.25,-10],
// 3 70 9.2 -.25 -10 55.5 -.25 -11 18.4 -.25 -10
  [3,70,9.2,-.25,-10,55.5,-.25,-11,18.4,-.25,-10],
// 3 70 18.4 -.25 -10 55.5 -.25 -11 27.6 -.25 -10
  [3,70,18.4,-.25,-10,55.5,-.25,-11,27.6,-.25,-10],
// 3 70 27.6 -.25 -10 55.5 -.25 -11 36.8 -.25 -10
  [3,70,27.6,-.25,-10,55.5,-.25,-11,36.8,-.25,-10],
// 3 70 36.8 -.25 -10 55.5 -.25 -11 46 -.25 -10
  [3,70,36.8,-.25,-10,55.5,-.25,-11,46,-.25,-10],
// 3 70 46 -.25 -10 55.5 -.25 -11 55.2 -.25 -10
  [3,70,46,-.25,-10,55.5,-.25,-11,55.2,-.25,-10],
];
module ldraw_lib__4269558c(step=0, col=false, unit=2/5, alt=false, line=0.2, solid=!$preview)
    makepoly(ldraw_lib__4269558c(), step=step, col=col, unit=unit, alt=alt, line=line, solid=solid);
ldraw_lib__4269558c(line=0.2);
